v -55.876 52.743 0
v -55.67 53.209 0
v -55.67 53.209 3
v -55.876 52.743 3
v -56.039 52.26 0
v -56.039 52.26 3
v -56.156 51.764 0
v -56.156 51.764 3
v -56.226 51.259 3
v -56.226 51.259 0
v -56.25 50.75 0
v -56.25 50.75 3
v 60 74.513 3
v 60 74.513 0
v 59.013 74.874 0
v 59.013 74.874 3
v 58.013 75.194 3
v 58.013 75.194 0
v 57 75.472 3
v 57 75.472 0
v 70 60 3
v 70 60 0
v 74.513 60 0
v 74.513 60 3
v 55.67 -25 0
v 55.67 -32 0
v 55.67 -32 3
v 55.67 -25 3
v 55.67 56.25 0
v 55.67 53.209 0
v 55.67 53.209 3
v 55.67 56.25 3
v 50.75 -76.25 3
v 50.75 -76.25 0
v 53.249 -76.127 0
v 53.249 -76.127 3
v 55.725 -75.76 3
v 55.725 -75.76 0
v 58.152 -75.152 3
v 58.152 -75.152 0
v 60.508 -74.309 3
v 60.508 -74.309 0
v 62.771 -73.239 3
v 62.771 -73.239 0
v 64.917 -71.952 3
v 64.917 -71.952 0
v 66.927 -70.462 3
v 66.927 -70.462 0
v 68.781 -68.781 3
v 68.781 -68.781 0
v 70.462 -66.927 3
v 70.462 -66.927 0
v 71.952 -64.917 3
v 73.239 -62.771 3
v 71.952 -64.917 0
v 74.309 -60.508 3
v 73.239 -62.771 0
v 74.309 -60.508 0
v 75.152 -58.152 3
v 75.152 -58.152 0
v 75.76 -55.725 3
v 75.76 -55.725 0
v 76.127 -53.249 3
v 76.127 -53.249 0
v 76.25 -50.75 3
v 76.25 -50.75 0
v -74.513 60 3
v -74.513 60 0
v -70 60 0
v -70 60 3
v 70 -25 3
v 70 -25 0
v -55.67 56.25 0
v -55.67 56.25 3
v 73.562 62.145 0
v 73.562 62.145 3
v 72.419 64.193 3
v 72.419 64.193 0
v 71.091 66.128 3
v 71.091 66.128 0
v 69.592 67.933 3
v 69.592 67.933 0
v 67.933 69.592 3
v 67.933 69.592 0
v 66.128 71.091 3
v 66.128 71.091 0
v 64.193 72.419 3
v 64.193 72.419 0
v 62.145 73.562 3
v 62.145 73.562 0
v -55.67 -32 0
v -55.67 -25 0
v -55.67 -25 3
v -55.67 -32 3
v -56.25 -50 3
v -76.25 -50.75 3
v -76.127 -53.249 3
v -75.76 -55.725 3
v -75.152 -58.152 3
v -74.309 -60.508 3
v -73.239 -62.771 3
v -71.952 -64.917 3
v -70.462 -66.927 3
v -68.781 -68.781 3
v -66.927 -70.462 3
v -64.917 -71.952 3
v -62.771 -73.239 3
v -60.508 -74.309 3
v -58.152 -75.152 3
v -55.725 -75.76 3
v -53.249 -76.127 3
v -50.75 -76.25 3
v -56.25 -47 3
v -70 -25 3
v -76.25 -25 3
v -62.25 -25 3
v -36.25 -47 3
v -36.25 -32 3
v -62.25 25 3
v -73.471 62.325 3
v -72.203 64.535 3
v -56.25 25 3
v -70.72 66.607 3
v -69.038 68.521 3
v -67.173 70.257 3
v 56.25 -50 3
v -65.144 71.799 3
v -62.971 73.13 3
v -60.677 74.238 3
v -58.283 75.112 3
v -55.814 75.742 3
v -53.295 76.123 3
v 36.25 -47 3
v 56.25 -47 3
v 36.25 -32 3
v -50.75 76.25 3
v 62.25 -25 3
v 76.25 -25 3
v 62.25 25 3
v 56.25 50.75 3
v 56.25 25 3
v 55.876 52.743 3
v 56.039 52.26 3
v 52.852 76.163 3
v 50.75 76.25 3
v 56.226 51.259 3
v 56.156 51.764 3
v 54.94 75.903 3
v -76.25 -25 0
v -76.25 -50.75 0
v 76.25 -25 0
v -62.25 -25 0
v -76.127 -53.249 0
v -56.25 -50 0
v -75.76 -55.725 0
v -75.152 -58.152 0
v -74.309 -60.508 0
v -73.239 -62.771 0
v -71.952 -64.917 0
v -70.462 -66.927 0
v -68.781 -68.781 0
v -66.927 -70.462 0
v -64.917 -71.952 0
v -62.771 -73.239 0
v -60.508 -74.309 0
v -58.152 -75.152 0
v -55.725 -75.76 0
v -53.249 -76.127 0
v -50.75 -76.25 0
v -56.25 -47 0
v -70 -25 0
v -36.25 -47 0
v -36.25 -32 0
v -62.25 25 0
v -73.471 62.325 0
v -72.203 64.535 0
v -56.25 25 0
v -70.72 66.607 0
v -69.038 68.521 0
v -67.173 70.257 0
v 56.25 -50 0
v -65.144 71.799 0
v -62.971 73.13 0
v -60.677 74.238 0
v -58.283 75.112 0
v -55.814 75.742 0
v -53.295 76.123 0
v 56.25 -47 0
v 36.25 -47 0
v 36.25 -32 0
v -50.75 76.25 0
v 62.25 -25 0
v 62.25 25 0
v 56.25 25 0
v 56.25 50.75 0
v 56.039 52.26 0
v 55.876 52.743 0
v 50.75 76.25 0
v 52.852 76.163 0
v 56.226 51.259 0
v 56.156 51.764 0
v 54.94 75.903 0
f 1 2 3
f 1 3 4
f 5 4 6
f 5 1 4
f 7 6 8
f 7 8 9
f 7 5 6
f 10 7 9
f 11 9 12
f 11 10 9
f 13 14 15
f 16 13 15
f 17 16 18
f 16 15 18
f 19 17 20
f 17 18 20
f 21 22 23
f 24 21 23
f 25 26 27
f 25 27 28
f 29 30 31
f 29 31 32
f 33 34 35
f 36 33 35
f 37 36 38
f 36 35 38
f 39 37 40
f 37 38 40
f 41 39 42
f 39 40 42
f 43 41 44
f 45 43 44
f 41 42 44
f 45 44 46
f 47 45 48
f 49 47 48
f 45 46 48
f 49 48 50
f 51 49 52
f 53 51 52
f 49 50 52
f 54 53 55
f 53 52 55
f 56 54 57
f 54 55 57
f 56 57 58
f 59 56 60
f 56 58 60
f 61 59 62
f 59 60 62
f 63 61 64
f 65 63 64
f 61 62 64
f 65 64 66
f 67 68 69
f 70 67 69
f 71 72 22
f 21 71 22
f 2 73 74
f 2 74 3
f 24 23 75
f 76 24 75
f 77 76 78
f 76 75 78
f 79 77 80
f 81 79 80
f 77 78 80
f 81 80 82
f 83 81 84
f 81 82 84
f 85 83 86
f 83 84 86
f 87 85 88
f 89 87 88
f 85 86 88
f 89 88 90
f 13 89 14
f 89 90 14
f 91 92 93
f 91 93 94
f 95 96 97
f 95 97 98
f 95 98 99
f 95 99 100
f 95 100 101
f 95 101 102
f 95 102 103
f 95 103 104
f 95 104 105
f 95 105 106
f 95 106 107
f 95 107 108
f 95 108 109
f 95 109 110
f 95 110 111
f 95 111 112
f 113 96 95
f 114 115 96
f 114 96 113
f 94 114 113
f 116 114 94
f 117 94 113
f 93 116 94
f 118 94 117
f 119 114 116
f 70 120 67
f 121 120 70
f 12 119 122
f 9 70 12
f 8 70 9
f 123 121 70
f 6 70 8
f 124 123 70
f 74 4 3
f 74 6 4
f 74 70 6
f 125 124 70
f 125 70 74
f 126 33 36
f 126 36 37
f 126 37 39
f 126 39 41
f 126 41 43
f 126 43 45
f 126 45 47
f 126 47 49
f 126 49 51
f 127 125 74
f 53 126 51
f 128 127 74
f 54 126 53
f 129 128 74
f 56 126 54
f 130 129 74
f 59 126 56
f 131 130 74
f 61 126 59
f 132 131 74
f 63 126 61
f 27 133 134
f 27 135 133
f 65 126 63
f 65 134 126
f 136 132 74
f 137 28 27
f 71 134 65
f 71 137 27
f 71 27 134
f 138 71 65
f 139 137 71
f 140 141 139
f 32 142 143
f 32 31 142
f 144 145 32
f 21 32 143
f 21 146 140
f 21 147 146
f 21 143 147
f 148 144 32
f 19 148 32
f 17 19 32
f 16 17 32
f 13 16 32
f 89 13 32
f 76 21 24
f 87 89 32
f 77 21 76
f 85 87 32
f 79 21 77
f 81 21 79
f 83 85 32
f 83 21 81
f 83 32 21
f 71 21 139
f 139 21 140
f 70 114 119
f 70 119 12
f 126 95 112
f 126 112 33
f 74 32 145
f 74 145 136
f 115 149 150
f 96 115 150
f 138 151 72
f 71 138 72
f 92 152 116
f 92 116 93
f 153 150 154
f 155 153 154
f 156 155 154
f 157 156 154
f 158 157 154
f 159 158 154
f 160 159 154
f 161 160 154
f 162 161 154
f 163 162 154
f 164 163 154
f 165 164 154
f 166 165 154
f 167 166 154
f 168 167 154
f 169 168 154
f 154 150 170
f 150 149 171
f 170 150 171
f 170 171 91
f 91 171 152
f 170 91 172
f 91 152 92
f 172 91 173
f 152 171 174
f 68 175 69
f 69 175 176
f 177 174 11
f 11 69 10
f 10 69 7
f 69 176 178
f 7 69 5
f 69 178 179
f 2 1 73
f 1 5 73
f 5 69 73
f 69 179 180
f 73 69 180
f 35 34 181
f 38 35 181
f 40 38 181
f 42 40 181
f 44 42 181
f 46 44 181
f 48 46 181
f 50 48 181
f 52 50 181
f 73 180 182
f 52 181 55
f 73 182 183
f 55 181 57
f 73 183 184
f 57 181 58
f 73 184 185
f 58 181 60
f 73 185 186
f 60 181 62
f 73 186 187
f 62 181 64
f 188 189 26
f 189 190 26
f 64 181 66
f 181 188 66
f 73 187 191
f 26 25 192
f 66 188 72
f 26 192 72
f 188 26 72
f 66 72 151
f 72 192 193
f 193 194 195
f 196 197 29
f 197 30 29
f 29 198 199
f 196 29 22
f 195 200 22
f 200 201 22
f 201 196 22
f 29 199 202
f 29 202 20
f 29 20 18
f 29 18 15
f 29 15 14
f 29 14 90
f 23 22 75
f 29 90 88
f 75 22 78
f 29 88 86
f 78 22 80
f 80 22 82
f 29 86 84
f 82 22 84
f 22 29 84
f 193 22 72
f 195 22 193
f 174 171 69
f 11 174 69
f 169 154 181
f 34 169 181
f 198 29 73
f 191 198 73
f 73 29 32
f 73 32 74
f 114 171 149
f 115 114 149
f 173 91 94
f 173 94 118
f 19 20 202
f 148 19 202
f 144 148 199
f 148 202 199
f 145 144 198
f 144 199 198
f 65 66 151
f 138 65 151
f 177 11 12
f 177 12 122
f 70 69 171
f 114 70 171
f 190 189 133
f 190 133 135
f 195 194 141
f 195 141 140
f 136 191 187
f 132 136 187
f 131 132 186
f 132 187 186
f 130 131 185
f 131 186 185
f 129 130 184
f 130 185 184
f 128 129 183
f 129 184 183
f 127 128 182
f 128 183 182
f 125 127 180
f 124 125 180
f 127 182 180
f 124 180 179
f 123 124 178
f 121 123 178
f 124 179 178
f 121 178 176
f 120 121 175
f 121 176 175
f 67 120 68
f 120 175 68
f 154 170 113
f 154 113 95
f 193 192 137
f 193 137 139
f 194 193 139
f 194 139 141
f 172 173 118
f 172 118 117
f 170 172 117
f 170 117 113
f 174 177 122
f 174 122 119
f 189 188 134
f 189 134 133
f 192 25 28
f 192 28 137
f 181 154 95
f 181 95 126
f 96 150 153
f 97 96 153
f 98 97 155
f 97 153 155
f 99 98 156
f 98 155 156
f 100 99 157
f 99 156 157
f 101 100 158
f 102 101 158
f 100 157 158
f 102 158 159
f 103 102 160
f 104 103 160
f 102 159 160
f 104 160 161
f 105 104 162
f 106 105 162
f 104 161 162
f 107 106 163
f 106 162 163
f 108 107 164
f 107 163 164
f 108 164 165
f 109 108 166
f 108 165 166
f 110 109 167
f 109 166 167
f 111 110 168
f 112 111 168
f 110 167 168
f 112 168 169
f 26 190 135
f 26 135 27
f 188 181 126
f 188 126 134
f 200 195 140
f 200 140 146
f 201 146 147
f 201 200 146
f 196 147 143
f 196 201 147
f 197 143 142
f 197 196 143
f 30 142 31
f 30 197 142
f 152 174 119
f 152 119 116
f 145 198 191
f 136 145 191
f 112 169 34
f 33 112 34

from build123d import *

# Parameters (mm, degrees)
BOSS_EXTRUDE1_DEPTH = 3


with BuildPart() as part:
    # Sketch1 → Boss-Extrude1 (new body)
    with BuildSketch(Plane.XY):
        with BuildLine():
            Line((76.25, -25), (70, -25))
            Line((70, -25), (70, 60))
            Line((70, 60), (74.513154252, 60))
            ThreePointArc((74.513154252, 60), (68.78122292, 68.78122292), (60, 74.513154252))
            ThreePointArc((60, 74.513154252), (58.514821012, 75.039041863), (57, 75.472206616))
            ThreePointArc((57, 75.472206616), (53.899105529, 76.05480457), (50.75, 76.25))
            Line((50.75, 76.25), (-50.75, 76.25))
            ThreePointArc((-50.75, 76.25), (-65.14400917, 71.79904986), (-74.513154252, 60))
            Line((-74.513154252, 60), (-70, 60))
            Line((-70, 60), (-70, -25))
            Line((-70, -25), (-76.25, -25))
            Line((-76.25, -25), (-76.25, -50.75))
            ThreePointArc((-76.25, -50.75), (-68.78122292, -68.78122292), (-50.75, -76.25))
            Line((-50.75, -76.25), (50.75, -76.25))
            ThreePointArc((50.75, -76.25), (68.78122292, -68.78122292), (76.25, -50.75))
            Line((76.25, -50.75), (76.25, -25))
        make_face()
        with BuildLine():
            Line((56.25, -50), (56.25, -47))
            Line((56.25, -47), (49.746794345, -47))
            Line((49.746794345, -47), (36.25, -47))
            Line((36.25, -47), (36.25, -32))
            Line((36.25, -32), (55.669788796, -32))
            Line((55.669788796, -32), (55.669788796, -25))
            Line((55.669788796, -25), (56.25, -25))
            Line((56.25, -25), (62.25, -25))
            Line((62.25, -25), (62.25, 25))
            Line((62.25, 25), (56.249999998, 25))
            Line((56.249999998, 25), (56.249999998, 50.75))
            ThreePointArc((56.249999998, 50.75), (56.102982269, 52.013163019), (55.669788794, 53.208796089))
            Line((55.669788794, 53.208796089), (55.669788794, 56.25))
            Line((55.669788794, 56.25), (-55.669788796, 56.25))
            Line((-55.669788796, 56.25), (-55.669788796, 53.208796089))
            ThreePointArc((-55.669788796, 53.208796089), (-56.10298227, 52.013163019), (-56.25, 50.75))
            Line((-56.25, 50.75), (-56.25, 25))
            Line((-56.25, 25), (-62.25, 25))
            Line((-62.25, 25), (-62.25, -25))
            Line((-62.25, -25), (-56.25, -25))
            Line((-56.25, -25), (-55.669788796, -25))
            Line((-55.669788796, -25), (-55.669788796, -32))
            Line((-55.669788796, -32), (-36.25, -32))
            Line((-36.25, -32), (-36.25, -47))
            Line((-36.25, -47), (-49.746794345, -47))
            Line((-49.746794345, -47), (-56.25, -47))
            Line((-56.25, -47), (-56.25, -50))
            Line((-56.25, -50), (-49.746794345, -50))
            Line((-49.746794345, -50), (49.746794345, -50))
            Line((49.746794345, -50), (56.25, -50))
        make_face(mode=Mode.SUBTRACT)
    extrude(amount=BOSS_EXTRUDE1_DEPTH)


solid = part.part
